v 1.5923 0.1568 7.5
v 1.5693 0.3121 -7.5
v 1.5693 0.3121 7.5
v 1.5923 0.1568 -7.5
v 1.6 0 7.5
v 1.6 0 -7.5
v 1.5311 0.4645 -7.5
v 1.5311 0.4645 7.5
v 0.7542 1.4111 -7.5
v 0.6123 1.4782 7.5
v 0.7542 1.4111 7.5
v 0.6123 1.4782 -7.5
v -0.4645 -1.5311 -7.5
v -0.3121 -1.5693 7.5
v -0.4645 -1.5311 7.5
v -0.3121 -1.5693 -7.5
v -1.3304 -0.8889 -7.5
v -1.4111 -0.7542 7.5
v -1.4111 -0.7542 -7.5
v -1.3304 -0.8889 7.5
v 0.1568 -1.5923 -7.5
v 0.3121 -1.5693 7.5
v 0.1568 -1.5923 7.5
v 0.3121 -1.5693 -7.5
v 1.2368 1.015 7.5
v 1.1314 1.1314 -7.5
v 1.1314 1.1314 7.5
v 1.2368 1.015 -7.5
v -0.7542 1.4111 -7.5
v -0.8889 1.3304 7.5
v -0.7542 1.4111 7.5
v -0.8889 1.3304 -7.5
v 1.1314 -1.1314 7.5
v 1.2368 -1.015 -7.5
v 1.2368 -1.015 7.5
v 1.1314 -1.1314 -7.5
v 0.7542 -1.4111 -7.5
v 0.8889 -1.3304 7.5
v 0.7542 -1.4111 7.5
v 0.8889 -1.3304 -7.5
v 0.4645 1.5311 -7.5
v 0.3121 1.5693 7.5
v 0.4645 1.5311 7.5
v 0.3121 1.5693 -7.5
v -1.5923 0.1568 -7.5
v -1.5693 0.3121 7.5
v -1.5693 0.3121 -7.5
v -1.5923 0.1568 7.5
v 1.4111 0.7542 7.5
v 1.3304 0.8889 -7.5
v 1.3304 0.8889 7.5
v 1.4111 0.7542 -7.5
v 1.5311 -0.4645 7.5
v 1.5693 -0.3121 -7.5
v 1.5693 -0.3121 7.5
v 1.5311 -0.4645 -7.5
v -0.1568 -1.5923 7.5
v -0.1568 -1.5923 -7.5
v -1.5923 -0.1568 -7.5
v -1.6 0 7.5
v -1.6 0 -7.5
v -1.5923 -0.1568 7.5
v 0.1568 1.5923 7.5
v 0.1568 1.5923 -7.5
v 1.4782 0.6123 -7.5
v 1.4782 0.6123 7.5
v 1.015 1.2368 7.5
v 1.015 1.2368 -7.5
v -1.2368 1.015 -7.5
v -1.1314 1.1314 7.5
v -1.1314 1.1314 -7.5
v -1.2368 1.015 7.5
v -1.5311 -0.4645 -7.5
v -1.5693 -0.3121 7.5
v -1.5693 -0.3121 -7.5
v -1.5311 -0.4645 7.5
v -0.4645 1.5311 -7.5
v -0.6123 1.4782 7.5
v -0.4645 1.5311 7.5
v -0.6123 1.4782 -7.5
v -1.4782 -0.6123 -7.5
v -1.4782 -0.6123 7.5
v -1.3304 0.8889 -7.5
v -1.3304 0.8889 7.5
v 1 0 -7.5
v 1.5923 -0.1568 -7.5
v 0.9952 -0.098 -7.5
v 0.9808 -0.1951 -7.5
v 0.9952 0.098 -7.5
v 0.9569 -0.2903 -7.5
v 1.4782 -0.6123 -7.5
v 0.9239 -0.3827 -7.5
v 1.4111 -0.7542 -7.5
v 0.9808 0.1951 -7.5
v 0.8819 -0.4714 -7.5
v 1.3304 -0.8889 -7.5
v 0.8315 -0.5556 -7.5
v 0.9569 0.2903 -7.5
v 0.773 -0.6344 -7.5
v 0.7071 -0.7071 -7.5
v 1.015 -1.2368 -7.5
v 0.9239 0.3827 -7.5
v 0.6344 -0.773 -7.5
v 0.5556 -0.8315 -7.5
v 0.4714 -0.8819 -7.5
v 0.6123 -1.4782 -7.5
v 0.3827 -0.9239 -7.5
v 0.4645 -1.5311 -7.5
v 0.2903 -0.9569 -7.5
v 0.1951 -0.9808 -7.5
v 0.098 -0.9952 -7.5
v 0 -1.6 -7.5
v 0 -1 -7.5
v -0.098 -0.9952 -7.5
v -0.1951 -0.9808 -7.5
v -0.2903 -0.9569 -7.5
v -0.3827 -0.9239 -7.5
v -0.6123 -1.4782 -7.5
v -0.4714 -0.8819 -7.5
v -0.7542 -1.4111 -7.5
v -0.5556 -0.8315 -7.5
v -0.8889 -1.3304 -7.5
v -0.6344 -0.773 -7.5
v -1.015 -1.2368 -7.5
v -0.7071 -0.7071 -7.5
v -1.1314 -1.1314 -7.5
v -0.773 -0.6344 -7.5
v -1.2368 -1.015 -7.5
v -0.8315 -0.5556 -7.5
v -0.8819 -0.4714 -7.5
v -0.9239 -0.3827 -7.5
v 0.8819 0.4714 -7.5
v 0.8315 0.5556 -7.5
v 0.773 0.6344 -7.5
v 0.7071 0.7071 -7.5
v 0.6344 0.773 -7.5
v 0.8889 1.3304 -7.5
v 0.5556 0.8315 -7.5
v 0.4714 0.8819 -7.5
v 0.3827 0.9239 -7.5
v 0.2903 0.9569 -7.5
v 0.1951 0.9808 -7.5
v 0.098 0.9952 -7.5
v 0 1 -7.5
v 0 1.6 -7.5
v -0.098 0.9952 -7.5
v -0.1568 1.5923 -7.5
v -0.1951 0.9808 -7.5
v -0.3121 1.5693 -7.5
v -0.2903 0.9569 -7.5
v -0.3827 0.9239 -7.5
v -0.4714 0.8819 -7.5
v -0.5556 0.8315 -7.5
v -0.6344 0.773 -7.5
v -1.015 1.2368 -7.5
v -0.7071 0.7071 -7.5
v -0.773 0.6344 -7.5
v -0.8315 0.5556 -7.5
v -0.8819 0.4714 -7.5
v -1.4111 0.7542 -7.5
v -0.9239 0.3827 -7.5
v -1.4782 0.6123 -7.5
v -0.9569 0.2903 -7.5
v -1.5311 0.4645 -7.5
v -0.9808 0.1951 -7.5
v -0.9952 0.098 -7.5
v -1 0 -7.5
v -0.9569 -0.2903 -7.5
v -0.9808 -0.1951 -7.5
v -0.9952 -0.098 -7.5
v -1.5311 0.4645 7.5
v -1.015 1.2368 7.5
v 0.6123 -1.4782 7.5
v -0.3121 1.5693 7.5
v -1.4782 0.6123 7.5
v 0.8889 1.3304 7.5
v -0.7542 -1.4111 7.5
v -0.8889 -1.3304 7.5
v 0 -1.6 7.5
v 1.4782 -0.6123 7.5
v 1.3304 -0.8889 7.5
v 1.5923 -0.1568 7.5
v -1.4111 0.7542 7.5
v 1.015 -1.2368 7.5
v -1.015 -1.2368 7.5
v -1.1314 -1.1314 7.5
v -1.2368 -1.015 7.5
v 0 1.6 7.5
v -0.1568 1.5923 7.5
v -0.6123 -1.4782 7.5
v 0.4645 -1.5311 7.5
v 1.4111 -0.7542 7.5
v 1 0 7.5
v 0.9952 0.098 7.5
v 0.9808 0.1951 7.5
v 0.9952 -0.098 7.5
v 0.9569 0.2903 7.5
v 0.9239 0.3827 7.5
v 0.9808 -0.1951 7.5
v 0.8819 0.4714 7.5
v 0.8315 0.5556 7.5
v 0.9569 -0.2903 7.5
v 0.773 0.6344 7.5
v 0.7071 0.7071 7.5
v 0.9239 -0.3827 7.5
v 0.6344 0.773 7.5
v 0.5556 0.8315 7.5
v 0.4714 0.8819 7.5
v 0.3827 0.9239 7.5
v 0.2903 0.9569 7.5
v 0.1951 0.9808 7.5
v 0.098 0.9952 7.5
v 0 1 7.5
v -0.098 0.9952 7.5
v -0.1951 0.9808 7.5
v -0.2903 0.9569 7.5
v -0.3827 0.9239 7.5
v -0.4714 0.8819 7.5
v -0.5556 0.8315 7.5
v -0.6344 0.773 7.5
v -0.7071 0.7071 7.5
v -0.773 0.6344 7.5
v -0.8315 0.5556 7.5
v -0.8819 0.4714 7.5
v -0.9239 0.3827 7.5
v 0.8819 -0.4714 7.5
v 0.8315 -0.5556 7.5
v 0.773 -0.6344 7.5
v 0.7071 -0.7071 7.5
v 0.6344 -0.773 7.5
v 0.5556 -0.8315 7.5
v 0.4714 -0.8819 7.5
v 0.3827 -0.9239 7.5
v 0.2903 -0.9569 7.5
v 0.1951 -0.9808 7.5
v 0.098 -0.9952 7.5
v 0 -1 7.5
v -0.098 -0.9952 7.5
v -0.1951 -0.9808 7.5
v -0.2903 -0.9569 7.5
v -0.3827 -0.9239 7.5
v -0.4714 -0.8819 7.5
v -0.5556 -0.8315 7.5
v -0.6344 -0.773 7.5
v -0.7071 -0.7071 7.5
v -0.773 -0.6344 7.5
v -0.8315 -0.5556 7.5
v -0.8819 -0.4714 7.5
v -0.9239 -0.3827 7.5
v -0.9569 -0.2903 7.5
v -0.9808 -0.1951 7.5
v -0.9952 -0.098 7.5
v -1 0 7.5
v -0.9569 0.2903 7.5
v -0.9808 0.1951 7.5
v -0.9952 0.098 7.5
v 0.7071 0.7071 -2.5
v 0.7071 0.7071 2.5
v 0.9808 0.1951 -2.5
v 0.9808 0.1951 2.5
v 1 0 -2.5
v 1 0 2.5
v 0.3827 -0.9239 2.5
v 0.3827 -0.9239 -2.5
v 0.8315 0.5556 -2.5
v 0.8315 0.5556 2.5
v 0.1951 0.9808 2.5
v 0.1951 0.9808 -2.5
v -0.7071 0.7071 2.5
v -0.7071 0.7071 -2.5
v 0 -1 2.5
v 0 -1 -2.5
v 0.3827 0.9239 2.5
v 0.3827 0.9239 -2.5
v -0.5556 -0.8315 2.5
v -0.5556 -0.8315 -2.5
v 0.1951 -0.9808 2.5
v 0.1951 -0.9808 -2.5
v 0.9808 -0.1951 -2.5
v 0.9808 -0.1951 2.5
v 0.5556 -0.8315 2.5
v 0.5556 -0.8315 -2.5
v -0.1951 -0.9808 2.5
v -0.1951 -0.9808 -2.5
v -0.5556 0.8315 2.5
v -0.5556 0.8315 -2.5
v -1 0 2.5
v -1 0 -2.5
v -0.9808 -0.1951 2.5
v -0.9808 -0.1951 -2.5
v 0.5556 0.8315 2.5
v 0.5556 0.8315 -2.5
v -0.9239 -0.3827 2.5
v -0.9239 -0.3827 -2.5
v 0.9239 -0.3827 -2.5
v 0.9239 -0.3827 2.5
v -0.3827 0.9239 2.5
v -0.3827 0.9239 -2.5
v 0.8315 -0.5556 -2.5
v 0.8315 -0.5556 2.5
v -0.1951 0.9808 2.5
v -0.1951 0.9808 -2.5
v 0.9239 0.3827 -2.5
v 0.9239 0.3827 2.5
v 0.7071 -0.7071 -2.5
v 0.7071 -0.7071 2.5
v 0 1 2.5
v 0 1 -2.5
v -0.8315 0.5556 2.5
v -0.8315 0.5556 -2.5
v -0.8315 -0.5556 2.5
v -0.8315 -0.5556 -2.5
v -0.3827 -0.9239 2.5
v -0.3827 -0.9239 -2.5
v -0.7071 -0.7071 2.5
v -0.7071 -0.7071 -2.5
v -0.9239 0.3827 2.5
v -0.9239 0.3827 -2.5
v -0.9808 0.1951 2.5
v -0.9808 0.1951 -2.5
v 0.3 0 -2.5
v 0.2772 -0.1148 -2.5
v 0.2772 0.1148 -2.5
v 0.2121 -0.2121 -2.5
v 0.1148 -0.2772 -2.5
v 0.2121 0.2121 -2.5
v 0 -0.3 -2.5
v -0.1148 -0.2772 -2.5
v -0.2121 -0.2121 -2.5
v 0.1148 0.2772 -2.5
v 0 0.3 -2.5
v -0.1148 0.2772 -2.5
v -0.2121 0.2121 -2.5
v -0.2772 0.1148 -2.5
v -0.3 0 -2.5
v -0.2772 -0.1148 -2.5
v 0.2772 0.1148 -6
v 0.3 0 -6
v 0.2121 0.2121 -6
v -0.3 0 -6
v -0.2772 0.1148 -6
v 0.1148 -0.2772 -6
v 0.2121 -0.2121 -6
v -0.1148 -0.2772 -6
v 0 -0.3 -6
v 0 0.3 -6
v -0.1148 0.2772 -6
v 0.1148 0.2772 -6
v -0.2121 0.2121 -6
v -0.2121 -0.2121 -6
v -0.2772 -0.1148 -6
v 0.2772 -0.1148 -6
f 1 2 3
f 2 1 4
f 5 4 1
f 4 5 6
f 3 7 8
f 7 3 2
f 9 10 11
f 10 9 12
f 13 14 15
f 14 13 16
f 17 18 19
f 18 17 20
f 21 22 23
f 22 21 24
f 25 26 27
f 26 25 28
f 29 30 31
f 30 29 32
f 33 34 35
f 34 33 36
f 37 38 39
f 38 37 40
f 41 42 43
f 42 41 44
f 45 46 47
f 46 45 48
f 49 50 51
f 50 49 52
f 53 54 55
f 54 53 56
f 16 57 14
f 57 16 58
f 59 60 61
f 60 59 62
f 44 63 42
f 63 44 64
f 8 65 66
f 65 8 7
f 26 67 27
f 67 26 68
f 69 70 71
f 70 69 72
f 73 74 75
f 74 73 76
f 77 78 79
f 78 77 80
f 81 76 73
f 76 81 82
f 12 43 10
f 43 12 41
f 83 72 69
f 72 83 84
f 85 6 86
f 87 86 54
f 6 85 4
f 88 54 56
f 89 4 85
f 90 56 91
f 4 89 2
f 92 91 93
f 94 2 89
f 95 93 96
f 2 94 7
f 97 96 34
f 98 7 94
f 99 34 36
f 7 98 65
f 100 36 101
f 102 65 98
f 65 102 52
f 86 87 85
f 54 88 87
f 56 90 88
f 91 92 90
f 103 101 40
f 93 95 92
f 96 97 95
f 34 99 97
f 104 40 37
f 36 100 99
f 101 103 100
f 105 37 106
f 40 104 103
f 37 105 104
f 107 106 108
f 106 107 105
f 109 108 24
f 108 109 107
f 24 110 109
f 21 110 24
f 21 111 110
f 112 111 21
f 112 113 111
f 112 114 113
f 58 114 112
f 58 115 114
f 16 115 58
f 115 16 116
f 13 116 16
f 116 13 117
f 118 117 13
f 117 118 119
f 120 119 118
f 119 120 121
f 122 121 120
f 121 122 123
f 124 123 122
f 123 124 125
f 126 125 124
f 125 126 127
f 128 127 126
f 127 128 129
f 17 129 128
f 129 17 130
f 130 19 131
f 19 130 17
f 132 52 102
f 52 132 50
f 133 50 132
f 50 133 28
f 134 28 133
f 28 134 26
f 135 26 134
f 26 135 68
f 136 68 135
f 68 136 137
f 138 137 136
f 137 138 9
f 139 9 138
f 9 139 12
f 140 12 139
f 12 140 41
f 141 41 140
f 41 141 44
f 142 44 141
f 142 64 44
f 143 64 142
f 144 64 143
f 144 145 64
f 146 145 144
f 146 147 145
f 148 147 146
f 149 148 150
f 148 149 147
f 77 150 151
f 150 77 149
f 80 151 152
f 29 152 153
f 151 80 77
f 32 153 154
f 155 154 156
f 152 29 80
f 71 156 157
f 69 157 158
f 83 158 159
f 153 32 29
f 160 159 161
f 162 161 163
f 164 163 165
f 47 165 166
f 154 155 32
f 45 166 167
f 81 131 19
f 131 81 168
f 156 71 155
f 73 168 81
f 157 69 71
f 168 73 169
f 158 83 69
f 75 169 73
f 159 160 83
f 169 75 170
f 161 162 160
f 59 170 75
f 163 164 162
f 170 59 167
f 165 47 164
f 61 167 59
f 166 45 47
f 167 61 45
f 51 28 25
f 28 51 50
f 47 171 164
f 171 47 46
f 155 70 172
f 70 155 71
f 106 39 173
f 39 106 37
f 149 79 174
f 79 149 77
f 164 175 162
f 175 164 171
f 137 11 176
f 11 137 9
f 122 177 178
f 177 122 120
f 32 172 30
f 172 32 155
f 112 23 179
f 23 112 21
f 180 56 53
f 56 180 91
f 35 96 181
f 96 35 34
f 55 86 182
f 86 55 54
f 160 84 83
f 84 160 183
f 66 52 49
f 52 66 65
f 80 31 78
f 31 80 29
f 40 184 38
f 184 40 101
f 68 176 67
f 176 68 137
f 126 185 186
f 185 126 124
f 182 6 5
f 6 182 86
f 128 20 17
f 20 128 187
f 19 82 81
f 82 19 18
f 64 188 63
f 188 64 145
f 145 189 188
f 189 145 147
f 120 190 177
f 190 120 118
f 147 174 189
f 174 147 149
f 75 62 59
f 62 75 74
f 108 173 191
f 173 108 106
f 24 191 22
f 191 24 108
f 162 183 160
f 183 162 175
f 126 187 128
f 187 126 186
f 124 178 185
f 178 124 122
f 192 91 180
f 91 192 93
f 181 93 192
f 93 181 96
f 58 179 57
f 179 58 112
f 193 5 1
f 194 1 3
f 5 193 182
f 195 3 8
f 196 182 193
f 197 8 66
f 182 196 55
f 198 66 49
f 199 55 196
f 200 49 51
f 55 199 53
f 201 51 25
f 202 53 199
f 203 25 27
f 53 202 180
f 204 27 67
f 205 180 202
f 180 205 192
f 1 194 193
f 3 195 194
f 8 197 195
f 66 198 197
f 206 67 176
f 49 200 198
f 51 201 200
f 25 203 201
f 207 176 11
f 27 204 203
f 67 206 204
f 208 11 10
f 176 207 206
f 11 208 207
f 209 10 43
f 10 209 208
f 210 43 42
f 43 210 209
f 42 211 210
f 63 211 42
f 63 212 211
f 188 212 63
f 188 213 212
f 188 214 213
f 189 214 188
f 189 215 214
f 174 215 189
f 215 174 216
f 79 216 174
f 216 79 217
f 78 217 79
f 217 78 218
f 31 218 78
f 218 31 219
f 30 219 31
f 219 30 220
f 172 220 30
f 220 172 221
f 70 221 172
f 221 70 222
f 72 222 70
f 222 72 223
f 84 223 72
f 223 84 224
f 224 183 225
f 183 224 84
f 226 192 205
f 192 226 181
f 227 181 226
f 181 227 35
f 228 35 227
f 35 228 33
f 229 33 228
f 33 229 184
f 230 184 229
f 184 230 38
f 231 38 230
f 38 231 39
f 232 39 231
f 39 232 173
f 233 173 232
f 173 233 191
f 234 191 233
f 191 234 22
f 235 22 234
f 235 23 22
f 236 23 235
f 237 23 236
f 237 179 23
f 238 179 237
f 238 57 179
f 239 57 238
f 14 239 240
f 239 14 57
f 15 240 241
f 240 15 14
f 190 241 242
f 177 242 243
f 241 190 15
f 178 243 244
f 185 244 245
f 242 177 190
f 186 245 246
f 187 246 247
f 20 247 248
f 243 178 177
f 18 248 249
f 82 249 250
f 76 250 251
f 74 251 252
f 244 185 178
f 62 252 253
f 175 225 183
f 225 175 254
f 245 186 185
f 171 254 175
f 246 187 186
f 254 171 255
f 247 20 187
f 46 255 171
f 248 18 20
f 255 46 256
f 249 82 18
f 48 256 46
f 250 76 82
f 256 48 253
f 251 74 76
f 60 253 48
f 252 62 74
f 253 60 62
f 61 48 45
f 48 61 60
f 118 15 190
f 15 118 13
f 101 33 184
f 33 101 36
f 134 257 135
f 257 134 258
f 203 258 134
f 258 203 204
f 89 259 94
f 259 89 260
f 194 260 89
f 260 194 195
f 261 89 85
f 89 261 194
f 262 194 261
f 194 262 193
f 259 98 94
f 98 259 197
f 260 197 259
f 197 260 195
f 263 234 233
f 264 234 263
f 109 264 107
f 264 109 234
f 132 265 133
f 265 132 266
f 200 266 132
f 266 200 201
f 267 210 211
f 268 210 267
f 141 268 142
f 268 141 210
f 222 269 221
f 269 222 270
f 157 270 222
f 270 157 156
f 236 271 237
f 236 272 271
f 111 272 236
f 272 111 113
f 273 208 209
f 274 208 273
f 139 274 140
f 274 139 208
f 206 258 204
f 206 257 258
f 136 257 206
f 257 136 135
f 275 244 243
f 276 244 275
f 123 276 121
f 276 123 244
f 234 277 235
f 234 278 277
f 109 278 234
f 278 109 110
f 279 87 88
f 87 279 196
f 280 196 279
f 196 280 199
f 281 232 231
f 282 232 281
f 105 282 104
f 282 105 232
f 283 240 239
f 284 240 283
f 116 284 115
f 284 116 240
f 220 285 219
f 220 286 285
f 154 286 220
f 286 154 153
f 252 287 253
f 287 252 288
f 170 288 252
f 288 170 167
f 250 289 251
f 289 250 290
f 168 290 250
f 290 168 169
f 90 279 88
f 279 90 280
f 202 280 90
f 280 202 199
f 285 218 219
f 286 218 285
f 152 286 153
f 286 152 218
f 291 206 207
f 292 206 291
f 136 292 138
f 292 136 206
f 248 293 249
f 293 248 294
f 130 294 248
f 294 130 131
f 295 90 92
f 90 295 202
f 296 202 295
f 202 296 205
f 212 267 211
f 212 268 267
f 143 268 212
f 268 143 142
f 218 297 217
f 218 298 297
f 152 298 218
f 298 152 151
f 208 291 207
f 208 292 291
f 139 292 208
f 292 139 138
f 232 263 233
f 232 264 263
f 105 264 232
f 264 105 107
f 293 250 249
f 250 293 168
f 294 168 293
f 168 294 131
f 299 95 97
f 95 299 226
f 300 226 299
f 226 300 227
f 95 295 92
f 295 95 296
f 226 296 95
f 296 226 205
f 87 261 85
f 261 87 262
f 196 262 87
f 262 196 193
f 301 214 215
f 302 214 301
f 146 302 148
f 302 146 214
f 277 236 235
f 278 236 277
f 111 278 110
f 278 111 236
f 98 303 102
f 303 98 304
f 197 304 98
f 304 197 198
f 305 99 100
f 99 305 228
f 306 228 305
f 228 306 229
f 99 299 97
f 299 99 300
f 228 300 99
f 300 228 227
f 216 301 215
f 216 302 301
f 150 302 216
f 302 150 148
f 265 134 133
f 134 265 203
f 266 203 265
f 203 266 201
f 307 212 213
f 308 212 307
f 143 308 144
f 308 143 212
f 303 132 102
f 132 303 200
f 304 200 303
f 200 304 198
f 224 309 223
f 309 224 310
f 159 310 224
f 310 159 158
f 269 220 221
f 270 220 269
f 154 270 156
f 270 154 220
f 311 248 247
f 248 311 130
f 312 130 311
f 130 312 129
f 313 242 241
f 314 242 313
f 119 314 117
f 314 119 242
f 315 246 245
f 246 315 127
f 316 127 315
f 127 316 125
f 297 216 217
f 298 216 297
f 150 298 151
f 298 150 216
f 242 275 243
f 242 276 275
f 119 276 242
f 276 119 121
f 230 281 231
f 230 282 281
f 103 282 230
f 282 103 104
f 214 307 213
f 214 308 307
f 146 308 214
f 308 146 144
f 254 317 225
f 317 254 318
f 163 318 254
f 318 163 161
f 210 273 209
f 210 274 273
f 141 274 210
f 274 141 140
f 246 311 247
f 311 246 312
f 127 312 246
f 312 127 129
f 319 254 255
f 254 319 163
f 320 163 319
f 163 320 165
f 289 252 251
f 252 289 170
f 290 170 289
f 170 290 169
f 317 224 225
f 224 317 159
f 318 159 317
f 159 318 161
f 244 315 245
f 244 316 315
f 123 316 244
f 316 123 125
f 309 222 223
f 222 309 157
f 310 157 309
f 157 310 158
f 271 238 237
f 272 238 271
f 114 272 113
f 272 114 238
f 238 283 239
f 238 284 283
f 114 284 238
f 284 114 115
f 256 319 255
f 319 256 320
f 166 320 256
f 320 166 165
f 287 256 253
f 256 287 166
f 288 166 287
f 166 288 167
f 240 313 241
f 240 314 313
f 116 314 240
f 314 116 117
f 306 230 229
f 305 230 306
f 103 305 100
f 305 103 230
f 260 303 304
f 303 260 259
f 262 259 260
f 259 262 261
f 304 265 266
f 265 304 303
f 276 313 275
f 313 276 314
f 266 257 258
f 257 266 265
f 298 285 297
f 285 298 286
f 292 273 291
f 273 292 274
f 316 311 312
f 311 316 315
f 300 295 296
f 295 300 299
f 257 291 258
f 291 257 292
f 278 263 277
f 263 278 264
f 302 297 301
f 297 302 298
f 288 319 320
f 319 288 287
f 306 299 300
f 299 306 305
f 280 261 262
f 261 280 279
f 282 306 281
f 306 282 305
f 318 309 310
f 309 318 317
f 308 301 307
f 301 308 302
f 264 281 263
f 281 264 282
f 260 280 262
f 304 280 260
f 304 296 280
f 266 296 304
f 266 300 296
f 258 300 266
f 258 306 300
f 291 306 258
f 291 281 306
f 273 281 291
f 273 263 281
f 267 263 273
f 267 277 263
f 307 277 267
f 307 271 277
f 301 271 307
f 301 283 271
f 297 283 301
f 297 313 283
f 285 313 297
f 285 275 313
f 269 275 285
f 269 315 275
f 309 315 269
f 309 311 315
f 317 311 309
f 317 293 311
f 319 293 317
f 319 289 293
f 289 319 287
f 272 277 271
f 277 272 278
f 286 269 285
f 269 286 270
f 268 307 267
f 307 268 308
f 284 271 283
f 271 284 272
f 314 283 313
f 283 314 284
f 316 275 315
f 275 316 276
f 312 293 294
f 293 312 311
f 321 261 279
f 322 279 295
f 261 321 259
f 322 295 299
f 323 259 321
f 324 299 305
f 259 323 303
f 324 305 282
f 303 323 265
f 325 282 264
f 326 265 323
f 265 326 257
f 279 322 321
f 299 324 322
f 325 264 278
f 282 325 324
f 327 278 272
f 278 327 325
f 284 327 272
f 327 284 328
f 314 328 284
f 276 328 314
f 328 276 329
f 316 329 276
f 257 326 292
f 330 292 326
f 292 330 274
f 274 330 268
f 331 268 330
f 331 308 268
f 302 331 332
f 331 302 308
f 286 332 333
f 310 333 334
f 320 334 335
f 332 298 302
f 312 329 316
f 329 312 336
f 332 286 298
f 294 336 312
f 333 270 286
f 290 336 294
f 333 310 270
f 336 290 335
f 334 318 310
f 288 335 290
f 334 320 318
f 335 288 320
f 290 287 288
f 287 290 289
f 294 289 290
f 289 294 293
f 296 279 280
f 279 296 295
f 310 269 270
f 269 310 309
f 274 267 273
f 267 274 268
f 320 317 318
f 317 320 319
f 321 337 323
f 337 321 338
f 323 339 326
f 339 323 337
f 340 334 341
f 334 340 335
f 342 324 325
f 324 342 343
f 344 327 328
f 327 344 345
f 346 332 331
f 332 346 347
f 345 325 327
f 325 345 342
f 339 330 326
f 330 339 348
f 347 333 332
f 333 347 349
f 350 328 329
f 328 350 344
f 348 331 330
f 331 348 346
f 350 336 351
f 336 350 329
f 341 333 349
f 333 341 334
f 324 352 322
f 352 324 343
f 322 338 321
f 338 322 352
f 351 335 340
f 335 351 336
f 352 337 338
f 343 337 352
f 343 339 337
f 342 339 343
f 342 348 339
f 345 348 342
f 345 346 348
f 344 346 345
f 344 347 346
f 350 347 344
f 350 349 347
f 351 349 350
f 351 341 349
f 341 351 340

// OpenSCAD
// Parameters
length = 15; //[8:30:1]
forced_id = 0; //[0:10:0.5]
center = true; //[0:1:1]
original_id = 2; //[1:4:0.5]
original_od = 3.2; //[1.6:6.4:0.1]
id = forced_id > 0 ? forced_id : original_id; //[1:4:0.5]
od = original_od; //[1.6:6.4:0.1]
eps_overlap = 0.8; //[0.2:2:0.1]

// Tubing - complete geometry
module tubing() {
  color([0.85, 0.85, 0.8]) { // Off-white for heatshrink
    difference() {
      // Outer cylinder
      cylinder(h=length, r=od/2, center=center, $fn=64);
      // Inner cylinder
      cylinder(h=length + 2*eps_overlap, r=id/2, center=center, $fn=64);
    }
  }
}

// Sleeved Resistor - complete geometry
module sleeved_resistor() {
  color([0.2, 0.2, 0.2]) { // Dark color for resistor
    // Resistor body
    cylinder(h=5, r=1, center=true, $fn=32);
    // Leads
    translate([0, 0, -3]) cylinder(h=6, r=0.3, center=true, $fn=16);
  }
}

// Assembly
module assembly() {
  tubing();
  translate([0, 0, 0]) sleeved_resistor();
}

assembly();
